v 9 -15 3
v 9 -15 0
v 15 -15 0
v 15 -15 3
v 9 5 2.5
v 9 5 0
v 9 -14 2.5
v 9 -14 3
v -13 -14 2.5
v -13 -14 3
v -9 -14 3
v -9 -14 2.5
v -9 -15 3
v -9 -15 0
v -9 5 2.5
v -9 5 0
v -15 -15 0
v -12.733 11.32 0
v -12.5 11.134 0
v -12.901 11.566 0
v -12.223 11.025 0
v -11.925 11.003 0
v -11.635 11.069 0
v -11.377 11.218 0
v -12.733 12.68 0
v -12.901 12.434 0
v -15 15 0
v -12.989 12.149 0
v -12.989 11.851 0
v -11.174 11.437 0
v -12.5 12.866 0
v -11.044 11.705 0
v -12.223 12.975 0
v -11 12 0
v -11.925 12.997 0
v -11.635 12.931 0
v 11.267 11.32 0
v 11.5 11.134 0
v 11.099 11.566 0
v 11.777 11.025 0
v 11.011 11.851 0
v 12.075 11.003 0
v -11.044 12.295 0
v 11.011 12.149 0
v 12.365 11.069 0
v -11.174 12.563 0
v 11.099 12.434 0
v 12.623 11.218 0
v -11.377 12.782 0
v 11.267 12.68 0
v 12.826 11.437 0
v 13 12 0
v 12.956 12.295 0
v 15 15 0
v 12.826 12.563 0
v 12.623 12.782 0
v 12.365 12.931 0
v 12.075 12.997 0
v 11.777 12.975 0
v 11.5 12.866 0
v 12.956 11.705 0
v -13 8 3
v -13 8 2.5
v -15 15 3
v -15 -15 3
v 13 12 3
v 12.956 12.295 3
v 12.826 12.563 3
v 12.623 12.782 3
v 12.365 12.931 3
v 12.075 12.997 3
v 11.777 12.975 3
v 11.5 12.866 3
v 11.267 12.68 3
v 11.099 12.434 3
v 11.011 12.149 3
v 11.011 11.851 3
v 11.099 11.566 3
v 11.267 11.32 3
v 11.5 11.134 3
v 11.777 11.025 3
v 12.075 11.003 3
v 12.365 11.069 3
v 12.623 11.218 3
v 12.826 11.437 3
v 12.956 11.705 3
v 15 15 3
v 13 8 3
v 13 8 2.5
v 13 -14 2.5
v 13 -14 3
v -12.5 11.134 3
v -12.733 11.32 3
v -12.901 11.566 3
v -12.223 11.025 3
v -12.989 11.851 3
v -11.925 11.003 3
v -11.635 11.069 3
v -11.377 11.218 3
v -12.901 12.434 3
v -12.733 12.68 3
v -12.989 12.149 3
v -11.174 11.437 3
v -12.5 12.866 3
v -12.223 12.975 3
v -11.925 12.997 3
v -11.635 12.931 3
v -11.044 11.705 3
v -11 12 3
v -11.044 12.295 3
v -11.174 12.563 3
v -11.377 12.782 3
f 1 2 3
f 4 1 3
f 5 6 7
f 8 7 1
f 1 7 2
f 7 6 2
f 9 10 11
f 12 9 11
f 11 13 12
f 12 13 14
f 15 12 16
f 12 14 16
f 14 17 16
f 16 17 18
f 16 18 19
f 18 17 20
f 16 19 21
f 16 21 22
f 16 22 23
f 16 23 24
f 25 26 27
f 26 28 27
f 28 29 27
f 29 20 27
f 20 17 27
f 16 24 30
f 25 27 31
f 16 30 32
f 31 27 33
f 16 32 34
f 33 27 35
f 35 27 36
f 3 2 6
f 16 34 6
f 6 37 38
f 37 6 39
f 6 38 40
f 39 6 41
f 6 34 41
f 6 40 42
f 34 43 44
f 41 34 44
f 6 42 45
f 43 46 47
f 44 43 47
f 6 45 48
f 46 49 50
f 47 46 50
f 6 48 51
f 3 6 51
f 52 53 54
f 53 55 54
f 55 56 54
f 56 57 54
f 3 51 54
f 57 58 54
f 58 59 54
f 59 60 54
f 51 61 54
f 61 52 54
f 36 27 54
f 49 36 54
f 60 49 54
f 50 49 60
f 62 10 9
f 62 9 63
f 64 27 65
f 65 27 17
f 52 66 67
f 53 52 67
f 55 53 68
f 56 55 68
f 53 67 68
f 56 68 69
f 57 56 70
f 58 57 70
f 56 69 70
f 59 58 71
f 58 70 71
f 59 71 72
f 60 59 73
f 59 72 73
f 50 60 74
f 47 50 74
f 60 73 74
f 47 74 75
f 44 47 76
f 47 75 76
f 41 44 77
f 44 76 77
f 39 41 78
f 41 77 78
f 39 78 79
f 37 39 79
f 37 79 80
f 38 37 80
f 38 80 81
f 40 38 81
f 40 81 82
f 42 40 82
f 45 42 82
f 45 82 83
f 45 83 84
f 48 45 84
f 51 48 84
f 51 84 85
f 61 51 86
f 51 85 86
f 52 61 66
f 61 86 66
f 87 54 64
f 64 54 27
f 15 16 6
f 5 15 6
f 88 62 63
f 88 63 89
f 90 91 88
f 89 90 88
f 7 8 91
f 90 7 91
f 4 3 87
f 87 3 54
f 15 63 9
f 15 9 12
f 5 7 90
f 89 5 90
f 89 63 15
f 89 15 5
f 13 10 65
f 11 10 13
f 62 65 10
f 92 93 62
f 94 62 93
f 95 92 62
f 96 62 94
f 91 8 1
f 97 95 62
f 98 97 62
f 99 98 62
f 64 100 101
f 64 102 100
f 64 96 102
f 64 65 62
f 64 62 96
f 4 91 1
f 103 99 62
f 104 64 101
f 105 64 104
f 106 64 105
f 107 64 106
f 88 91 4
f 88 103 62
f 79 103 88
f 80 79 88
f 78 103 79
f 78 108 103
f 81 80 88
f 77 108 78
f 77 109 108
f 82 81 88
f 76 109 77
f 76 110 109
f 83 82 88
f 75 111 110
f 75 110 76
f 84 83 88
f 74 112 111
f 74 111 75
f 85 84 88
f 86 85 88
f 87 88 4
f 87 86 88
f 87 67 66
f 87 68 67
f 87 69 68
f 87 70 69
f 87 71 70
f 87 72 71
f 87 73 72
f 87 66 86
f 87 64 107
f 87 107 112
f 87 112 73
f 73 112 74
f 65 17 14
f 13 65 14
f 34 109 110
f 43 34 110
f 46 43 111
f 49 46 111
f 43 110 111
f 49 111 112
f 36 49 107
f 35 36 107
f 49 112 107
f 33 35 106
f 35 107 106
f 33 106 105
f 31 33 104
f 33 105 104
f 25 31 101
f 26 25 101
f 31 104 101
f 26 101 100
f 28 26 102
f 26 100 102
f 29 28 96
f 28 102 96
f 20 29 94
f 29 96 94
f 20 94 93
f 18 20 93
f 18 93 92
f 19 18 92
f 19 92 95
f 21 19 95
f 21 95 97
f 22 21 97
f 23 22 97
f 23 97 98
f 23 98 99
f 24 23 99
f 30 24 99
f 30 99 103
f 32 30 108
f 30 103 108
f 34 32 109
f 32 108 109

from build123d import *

# Parameters (mm, degrees)
PAD_DEPTH       = 3
SKETCH001_R     = 1
POCKET_DEPTH    = 3
SKETCH002_W     = 26
SKETCH002_H     = 22
POCKET001_DEPTH = 0.5


with BuildPart() as part:
    # Sketch → Pad (new body)
    with BuildSketch(Plane.XY):
        Polygon((15, -15), (15, 15), (-15, 15), (-15, -15), (-9, -15), (-9, 5), (9, 5), (9, -15), align=None)
    extrude(amount=PAD_DEPTH)

    # Sketch001 (on Face10 of Pad) → Pocket (cut)
    with BuildSketch(Plane.XY.offset(3)):
        with Locations((-12, 12)):
            Circle(SKETCH001_R)
        with Locations((12, 12)):
            Circle(SKETCH001_R)
    extrude(amount=-POCKET_DEPTH, mode=Mode.SUBTRACT)

    # Sketch002 (on Face5 of Pocket) → Pocket001 (cut)
    with BuildSketch(Plane.XY.offset(3)):
        with Locations((0, -3)):
            Rectangle(SKETCH002_W, SKETCH002_H)
    extrude(amount=-POCKET001_DEPTH, mode=Mode.SUBTRACT)


solid = part.part
